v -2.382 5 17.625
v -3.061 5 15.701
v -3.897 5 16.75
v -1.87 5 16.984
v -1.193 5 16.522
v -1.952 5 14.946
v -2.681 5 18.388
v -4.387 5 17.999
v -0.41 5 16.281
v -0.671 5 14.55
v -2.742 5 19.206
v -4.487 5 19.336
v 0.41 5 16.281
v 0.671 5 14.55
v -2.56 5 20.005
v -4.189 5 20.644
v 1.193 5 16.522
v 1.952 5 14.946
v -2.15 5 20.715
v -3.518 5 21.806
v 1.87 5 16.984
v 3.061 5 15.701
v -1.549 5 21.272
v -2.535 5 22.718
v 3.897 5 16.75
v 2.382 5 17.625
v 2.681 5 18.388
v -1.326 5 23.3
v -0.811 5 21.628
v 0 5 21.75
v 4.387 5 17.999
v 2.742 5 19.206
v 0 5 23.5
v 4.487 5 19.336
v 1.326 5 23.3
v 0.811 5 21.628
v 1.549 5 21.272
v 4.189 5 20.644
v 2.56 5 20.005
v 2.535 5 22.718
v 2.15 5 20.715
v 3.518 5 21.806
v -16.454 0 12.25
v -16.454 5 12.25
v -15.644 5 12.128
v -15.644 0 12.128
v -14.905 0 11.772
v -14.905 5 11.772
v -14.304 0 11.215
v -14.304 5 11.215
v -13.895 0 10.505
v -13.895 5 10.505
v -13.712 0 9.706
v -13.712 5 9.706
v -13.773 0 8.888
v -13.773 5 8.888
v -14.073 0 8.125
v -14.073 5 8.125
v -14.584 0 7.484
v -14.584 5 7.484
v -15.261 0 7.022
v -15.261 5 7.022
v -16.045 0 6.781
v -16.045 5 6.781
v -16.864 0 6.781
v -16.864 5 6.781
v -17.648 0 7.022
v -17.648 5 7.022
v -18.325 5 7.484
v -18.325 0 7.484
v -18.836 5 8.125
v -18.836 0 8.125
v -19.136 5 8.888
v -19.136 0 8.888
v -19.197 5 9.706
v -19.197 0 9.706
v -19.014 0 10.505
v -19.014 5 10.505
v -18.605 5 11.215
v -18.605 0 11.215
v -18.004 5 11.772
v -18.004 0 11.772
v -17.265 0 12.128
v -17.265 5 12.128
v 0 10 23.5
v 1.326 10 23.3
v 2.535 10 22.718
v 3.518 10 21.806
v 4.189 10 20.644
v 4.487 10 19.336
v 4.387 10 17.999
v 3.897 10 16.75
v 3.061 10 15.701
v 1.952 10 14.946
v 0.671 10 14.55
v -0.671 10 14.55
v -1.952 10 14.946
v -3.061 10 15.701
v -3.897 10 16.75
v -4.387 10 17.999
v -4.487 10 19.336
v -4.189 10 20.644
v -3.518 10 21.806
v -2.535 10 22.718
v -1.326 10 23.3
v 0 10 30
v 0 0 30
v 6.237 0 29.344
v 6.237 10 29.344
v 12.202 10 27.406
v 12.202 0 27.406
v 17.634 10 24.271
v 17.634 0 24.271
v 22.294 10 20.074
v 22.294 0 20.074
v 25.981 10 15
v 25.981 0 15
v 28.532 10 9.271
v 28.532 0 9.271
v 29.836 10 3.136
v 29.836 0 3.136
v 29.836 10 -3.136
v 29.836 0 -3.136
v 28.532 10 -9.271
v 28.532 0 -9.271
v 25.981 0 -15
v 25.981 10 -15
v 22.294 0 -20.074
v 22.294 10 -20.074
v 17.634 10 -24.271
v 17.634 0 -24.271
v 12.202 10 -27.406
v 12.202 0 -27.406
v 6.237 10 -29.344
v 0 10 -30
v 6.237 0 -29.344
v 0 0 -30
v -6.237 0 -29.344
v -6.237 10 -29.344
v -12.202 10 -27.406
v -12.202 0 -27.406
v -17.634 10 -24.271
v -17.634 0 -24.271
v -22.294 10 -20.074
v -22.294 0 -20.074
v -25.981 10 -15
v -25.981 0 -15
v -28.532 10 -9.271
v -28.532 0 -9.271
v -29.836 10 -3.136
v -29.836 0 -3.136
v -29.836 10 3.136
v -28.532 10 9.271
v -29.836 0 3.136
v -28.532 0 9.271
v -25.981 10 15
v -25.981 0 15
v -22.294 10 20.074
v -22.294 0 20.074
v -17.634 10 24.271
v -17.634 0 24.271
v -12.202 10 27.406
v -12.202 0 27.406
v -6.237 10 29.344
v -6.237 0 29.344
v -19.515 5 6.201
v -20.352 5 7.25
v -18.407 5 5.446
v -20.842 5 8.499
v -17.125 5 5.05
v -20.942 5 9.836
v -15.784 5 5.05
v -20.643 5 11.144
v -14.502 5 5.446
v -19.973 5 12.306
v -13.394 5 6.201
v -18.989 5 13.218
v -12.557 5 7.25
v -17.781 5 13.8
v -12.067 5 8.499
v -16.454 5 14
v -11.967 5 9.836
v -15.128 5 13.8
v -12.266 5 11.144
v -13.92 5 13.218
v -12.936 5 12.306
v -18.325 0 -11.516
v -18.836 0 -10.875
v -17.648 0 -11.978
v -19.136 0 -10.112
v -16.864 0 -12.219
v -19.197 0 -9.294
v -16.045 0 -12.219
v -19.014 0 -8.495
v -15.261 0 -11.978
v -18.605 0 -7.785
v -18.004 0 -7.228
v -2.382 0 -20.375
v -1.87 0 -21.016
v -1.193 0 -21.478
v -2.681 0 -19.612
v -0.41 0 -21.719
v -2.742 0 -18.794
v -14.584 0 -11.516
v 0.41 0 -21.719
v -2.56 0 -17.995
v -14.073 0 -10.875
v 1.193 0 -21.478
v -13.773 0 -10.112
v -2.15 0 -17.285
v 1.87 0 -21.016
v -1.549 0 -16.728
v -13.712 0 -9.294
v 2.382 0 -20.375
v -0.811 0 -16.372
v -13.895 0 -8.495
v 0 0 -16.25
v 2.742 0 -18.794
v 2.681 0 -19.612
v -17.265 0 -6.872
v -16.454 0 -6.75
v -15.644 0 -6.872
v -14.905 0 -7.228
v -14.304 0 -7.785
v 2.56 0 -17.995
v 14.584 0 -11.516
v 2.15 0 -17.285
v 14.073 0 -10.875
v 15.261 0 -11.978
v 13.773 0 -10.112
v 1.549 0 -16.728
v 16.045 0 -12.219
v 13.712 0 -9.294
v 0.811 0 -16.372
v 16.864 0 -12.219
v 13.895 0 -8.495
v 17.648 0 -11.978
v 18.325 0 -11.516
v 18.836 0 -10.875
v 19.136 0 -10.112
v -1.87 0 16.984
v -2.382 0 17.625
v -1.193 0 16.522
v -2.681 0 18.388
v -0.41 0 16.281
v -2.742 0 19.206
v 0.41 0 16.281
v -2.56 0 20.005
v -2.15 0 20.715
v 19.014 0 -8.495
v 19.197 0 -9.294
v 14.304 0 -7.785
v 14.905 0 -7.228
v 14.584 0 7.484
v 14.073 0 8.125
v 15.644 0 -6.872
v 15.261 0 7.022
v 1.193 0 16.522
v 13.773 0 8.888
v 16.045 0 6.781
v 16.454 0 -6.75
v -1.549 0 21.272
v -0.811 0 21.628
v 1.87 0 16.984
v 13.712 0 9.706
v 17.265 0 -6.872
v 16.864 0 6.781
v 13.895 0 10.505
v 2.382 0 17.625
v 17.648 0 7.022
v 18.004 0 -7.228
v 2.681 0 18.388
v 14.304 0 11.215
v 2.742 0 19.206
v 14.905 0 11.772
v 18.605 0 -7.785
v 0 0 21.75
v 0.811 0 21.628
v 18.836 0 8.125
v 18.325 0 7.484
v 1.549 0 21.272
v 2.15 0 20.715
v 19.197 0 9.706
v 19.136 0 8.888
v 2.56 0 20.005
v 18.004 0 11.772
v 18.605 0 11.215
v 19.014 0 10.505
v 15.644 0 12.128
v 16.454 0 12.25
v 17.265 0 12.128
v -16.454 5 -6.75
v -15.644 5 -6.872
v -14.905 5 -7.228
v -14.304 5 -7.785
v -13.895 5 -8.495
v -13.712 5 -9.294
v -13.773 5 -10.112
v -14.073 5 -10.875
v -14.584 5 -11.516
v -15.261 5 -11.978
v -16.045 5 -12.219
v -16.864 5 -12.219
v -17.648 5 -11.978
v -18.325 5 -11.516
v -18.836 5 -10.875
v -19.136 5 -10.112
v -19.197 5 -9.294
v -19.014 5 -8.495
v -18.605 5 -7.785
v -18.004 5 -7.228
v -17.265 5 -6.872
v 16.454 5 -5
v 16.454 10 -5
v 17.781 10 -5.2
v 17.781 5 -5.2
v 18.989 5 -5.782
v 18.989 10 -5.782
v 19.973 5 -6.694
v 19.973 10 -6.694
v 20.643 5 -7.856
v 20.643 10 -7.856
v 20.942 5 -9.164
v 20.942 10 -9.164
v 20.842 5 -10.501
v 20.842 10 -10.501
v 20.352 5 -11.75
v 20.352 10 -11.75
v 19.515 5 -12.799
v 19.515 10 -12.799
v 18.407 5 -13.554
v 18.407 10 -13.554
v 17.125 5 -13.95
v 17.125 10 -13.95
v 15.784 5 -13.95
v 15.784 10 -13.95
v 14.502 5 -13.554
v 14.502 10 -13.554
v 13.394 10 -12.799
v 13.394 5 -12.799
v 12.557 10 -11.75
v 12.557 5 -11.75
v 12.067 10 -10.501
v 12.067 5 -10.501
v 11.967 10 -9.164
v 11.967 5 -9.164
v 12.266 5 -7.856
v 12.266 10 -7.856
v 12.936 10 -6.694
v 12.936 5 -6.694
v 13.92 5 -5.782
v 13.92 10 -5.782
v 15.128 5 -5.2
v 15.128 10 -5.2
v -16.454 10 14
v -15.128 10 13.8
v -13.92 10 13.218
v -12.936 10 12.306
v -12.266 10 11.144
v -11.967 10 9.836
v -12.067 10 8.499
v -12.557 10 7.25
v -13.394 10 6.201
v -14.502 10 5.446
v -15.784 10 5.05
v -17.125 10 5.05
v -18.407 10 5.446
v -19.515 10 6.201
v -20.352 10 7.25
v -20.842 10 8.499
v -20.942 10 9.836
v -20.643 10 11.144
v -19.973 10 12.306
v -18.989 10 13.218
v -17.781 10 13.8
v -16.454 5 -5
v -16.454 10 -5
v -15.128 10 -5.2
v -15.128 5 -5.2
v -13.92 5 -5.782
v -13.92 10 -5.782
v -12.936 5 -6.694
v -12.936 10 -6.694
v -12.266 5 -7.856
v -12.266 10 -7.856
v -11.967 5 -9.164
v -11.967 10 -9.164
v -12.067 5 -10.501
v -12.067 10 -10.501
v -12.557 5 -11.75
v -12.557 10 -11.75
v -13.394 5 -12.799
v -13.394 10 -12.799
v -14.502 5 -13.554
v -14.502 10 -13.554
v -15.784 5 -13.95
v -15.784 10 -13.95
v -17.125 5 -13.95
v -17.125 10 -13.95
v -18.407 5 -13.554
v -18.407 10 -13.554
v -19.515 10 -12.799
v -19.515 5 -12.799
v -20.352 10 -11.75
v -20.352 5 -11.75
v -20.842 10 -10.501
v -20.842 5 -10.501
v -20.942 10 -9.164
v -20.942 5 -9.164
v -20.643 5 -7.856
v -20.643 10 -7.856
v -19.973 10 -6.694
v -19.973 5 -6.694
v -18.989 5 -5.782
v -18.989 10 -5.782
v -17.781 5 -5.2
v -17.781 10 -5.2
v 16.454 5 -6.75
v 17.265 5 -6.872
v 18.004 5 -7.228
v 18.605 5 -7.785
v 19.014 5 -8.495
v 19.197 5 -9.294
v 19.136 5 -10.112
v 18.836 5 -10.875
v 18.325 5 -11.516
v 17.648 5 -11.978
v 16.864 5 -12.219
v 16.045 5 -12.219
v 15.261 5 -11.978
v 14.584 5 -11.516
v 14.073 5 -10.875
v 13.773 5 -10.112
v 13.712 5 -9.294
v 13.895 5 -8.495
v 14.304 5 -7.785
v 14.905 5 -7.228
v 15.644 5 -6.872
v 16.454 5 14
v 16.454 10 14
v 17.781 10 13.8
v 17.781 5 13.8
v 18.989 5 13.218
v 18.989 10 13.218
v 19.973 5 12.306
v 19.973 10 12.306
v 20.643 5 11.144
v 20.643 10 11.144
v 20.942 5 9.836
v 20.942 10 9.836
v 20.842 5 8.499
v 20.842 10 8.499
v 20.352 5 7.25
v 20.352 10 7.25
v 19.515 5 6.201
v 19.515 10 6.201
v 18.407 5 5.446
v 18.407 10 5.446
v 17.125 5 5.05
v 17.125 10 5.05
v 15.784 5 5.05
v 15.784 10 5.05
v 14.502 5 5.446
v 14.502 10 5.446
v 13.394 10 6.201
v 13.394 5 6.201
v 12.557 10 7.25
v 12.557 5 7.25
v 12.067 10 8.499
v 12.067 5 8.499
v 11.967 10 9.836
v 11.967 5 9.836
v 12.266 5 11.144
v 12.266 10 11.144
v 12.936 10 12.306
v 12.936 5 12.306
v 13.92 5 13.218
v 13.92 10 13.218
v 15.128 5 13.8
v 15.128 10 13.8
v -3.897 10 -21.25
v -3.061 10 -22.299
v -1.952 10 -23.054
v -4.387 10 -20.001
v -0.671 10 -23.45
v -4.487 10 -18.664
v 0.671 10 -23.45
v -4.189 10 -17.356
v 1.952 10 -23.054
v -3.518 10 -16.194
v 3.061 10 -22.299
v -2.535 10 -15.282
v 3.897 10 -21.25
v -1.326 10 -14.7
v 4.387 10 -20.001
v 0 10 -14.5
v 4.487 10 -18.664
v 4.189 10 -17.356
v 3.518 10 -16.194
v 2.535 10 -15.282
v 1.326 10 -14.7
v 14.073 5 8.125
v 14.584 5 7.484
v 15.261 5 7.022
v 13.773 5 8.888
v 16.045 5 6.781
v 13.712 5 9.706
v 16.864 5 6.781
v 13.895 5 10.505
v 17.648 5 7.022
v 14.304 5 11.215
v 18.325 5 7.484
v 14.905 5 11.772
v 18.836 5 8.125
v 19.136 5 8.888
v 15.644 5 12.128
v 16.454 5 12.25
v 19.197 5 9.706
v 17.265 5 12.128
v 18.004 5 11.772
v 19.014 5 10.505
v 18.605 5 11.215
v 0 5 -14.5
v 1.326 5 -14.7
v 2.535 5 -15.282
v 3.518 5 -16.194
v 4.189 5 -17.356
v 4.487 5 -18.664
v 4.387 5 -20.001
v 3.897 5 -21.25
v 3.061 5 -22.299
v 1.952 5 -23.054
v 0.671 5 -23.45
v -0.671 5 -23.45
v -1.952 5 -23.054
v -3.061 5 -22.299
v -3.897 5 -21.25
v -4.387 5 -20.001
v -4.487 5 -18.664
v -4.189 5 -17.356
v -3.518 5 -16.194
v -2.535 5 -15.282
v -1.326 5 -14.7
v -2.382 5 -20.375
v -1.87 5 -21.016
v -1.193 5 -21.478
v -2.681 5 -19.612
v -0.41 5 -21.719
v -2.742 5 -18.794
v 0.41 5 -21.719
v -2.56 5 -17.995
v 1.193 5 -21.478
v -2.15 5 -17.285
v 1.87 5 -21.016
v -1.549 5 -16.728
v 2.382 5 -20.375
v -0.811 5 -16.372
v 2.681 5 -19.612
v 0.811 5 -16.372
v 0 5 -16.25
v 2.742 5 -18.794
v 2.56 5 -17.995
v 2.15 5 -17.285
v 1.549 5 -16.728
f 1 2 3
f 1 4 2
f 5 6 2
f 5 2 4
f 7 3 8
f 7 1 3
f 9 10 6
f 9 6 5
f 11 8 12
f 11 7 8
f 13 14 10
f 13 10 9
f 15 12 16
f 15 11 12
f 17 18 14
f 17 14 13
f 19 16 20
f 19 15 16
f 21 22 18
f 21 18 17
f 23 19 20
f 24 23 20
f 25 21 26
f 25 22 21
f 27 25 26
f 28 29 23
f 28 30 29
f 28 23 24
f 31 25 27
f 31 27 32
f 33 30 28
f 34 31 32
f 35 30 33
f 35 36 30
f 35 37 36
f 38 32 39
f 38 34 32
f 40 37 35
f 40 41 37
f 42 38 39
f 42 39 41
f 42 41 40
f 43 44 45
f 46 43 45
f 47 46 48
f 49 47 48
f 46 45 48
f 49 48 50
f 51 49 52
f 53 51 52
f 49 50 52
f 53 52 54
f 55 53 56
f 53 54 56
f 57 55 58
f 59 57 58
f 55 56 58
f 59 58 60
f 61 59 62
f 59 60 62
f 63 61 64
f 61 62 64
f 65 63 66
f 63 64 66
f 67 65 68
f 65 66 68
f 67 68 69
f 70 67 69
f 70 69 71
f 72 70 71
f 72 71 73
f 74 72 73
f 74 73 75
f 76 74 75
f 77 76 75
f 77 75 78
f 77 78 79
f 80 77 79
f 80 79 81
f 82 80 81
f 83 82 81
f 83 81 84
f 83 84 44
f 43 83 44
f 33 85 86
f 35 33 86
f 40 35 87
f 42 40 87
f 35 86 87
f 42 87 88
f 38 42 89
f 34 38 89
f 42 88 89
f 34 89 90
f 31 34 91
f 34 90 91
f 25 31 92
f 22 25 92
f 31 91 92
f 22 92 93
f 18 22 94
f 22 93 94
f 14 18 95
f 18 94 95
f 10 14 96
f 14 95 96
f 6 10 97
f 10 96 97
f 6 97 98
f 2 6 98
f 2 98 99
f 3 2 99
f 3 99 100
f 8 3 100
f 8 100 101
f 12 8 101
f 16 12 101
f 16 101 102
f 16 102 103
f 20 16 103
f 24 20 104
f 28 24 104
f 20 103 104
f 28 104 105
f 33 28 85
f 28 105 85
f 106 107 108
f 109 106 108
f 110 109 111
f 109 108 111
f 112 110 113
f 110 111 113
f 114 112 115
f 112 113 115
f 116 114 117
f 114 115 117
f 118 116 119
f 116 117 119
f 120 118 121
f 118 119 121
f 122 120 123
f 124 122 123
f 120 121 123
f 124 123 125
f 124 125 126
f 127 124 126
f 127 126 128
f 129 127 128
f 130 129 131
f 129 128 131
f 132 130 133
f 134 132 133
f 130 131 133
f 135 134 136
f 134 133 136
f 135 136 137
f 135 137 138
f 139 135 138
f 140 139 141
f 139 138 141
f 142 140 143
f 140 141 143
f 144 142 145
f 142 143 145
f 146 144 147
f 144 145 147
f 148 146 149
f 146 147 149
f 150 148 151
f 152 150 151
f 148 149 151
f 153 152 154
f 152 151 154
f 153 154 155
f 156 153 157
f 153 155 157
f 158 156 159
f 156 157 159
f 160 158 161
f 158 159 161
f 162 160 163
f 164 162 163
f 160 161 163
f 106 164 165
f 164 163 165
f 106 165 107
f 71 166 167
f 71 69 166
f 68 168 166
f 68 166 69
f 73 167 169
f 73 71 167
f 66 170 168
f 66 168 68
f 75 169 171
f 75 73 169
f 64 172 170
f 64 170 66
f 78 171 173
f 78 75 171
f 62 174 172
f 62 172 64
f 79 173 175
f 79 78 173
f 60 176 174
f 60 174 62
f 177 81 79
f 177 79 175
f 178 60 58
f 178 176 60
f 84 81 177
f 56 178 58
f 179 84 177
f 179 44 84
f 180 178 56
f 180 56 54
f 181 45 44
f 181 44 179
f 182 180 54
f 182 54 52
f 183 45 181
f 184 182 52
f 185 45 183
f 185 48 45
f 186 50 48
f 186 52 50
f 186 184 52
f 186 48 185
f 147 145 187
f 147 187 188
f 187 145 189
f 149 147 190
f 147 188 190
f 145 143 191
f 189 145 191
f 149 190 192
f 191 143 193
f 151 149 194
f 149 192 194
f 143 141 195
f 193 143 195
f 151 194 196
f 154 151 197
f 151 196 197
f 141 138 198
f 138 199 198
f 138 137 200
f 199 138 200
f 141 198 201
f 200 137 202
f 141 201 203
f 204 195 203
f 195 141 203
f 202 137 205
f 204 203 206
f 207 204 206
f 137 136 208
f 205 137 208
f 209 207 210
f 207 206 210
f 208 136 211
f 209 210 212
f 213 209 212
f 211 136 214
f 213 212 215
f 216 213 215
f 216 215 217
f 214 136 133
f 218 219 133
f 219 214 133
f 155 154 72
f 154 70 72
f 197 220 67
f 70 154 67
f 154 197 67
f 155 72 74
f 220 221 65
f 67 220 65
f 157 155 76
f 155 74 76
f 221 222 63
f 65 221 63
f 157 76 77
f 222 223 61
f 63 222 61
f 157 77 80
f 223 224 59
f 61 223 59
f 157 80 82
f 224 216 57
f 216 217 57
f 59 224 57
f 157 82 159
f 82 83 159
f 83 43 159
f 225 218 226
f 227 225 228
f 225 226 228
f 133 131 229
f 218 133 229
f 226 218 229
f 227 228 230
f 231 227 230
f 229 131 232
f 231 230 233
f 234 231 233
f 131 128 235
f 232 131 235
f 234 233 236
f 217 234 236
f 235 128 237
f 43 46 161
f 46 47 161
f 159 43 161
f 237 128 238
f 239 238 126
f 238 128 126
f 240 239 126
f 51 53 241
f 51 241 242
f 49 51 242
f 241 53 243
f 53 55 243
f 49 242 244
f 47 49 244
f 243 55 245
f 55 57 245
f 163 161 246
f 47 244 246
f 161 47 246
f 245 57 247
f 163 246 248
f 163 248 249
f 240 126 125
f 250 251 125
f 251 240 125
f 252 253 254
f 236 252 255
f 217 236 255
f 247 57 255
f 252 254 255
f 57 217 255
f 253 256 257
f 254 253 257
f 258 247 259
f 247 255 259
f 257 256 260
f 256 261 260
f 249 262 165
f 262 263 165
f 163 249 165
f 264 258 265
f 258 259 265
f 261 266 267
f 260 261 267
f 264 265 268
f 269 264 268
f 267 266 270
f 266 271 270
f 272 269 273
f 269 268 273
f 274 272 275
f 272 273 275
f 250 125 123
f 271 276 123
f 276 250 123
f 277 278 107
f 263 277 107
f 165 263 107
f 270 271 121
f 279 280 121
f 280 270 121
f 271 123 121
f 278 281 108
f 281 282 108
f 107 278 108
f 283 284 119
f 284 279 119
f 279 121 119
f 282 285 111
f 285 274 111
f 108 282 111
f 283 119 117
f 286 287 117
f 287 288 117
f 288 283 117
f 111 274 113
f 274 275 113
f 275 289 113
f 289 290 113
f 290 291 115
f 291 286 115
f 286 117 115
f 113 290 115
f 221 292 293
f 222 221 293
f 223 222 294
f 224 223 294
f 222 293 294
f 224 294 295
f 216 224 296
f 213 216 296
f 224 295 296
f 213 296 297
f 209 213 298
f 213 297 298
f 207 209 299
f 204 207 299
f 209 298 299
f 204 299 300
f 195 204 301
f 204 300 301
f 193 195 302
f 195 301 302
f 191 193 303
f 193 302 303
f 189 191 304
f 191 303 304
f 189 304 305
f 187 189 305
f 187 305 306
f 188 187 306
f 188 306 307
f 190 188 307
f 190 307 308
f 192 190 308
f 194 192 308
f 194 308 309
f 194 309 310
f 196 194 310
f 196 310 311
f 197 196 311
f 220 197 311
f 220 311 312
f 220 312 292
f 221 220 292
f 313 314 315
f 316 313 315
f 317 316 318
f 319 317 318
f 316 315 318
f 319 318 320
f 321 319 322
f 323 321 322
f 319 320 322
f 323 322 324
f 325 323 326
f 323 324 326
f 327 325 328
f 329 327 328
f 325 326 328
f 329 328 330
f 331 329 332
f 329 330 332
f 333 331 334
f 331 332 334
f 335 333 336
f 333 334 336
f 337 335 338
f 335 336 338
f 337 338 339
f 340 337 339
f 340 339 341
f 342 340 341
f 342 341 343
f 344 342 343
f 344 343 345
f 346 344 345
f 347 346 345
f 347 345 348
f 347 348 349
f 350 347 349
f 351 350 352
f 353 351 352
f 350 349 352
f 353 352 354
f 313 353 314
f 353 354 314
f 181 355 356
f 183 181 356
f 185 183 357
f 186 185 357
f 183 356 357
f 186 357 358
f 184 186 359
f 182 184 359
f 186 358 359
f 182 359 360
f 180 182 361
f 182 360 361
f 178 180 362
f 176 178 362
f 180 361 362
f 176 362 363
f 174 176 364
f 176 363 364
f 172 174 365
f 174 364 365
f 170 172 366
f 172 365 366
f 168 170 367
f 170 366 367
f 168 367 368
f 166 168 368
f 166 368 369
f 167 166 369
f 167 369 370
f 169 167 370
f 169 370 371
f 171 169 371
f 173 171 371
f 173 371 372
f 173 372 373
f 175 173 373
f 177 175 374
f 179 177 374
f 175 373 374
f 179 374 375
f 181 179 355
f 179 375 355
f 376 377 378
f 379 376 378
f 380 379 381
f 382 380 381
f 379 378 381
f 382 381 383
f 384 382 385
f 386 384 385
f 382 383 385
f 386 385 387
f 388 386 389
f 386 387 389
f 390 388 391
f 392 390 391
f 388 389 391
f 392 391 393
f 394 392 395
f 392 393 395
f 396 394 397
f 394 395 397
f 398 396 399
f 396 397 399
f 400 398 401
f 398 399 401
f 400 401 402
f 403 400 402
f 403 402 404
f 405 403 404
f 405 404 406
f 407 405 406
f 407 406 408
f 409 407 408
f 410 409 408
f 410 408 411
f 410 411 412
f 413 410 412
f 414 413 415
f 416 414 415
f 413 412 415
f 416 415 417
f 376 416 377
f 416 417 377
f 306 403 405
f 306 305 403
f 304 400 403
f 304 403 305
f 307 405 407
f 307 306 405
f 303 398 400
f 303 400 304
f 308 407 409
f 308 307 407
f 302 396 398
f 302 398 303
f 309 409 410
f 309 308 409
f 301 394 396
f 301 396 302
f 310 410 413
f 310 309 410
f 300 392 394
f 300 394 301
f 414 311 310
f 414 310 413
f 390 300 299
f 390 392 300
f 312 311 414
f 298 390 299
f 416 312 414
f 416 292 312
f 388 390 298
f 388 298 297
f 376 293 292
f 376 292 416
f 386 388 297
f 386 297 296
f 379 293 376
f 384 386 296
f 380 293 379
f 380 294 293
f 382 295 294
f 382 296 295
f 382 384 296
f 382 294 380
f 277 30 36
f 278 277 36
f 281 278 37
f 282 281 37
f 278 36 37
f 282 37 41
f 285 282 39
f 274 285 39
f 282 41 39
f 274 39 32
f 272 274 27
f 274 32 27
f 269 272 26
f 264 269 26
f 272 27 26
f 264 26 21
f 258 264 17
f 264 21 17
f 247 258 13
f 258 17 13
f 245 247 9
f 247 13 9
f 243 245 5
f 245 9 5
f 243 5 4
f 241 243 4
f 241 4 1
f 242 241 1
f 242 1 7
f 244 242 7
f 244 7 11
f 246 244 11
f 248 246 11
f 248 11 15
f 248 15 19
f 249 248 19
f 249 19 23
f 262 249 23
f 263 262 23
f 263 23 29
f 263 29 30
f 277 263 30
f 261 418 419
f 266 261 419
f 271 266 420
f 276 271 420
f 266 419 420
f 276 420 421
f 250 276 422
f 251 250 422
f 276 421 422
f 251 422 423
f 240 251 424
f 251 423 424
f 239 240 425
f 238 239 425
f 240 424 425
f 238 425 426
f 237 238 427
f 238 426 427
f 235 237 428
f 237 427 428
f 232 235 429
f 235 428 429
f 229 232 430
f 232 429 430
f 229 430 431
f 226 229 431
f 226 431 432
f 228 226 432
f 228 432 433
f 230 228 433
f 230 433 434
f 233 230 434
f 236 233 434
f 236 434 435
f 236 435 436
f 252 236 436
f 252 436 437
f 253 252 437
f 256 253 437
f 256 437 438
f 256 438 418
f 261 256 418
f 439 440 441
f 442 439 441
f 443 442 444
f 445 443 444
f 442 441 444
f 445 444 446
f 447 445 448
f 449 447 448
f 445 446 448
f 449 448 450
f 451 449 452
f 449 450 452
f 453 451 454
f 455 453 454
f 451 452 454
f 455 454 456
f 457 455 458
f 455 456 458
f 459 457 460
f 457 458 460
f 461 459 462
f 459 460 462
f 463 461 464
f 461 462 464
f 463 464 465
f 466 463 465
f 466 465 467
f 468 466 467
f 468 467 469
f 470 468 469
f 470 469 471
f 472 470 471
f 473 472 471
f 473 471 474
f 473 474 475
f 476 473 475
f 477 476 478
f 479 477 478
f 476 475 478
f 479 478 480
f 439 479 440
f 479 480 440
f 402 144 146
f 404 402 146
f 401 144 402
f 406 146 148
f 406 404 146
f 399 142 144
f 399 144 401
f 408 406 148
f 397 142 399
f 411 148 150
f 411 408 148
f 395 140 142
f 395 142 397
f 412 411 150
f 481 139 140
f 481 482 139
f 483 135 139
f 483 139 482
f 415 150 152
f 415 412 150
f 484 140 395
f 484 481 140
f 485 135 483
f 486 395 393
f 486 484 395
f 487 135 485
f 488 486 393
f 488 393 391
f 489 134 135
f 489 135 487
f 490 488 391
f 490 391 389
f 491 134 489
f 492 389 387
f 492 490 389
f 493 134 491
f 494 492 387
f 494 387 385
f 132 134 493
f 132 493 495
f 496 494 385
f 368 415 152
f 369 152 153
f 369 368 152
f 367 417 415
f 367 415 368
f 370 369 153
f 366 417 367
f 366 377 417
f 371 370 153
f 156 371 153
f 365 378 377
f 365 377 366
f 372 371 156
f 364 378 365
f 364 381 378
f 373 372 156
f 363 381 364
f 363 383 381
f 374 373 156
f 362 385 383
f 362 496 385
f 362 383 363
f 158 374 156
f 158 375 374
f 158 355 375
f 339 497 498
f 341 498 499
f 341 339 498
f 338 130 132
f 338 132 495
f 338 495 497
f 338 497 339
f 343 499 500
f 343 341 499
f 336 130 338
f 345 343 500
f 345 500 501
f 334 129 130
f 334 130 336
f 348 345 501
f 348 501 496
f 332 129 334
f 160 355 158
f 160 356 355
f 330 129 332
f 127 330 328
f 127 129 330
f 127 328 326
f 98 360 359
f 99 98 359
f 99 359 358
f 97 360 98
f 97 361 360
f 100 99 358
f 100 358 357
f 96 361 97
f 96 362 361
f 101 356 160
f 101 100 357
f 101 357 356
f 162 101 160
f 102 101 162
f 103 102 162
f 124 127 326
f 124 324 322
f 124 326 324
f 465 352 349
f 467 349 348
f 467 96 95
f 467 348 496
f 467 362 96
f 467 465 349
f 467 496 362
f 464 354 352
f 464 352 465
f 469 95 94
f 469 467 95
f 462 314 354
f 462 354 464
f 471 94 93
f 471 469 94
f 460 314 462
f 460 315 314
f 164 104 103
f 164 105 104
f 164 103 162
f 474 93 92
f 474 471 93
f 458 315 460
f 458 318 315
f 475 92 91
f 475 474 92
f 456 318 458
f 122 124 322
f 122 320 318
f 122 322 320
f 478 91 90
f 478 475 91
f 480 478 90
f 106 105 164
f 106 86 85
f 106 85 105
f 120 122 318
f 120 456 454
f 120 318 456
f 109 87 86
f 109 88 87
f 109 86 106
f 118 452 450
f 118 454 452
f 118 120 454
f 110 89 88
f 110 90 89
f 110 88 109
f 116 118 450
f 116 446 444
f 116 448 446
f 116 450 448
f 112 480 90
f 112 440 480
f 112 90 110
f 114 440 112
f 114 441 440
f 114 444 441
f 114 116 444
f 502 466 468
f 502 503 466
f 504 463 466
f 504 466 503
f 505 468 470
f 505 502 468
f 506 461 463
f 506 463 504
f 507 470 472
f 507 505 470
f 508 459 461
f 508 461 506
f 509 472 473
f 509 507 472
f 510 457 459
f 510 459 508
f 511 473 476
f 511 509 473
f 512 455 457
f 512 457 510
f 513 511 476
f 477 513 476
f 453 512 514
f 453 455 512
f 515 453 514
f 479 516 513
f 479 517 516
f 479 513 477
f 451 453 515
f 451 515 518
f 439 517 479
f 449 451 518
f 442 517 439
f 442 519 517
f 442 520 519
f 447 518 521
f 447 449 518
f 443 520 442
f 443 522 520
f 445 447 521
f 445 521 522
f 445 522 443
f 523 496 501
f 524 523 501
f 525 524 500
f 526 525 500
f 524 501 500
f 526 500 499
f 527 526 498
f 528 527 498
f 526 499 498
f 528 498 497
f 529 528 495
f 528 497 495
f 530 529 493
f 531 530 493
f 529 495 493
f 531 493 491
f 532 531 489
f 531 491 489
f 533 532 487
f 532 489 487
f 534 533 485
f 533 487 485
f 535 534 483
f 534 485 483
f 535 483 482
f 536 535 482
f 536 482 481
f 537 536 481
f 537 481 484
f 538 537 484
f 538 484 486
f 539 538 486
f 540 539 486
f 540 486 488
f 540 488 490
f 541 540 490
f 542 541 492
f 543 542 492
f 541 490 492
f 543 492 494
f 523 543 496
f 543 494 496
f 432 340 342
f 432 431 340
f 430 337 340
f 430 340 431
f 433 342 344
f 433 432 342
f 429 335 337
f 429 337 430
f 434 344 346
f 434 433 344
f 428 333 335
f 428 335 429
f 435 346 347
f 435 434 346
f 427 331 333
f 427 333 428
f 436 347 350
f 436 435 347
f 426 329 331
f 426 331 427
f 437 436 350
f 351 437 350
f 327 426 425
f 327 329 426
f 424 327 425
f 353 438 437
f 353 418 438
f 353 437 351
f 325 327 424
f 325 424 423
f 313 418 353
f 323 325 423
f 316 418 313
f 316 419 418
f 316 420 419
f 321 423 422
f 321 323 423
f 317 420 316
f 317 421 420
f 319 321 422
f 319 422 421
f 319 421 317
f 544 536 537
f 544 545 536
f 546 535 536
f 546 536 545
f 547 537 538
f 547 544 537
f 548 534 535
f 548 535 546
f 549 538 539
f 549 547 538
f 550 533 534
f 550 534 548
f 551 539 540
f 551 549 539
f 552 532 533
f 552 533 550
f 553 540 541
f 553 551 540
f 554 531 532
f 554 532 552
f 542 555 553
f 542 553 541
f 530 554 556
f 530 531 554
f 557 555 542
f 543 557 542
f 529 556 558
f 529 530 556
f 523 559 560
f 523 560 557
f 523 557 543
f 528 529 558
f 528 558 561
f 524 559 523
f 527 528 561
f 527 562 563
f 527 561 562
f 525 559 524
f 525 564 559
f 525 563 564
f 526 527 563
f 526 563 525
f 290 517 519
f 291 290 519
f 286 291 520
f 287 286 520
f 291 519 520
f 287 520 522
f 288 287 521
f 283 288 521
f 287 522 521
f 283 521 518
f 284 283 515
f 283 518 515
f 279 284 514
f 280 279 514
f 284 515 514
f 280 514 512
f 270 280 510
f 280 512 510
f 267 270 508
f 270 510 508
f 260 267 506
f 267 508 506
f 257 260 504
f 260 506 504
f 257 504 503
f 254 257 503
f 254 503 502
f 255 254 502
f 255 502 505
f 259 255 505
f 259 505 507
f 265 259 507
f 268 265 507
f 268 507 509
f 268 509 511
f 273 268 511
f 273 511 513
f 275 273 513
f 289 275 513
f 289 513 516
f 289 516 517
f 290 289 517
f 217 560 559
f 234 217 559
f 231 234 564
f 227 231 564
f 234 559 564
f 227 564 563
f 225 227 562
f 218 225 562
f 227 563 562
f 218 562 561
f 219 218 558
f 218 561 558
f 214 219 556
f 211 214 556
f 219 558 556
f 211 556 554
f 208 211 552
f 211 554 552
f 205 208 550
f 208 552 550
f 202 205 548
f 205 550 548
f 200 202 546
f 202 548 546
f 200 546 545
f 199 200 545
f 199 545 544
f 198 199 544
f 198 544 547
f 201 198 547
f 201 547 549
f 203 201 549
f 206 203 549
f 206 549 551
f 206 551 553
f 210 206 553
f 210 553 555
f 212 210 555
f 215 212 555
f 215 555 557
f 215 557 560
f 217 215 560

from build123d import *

# Parameters (mm, degrees)
SKETCH1_R           = 30
BOSS_EXTRUDE1_DEPTH = 10
SKETCH2_R           = 4.5
CUT_EXTRUDE1_DEPTH  = 5
SKETCH3_R           = 2.75
CUT_EXTRUDE2_DEPTH  = 43.720018727


with BuildPart() as part:
    # Sketch1 → Boss-Extrude1 (new body)
    with BuildSketch(Plane(origin=(0, 0, 0), x_dir=(1, 0, 0), z_dir=(0, 1, 0))):
        with Locations(Location((0, 0, 0), (0, 0, 270))):
            Circle(SKETCH1_R)
    extrude(amount=BOSS_EXTRUDE1_DEPTH)

    # Sketch2 → Cut-Extrude1 (cut)
    with BuildSketch(Plane(origin=(0, 10, 0), x_dir=(1, 0, 0), z_dir=(0, 1, 0))):
        with Locations(Location((0, 19, 0), (0, 0, 270))):
            Circle(SKETCH2_R)
        with Locations(Location((16.454482672, 9.5, 0), (0, 0, 270))):
            Circle(SKETCH2_R)
        with Locations(Location((16.454482672, -9.5, 0), (0, 0, 270))):
            Circle(SKETCH2_R)
        with Locations(Location((0, -19, 0), (0, 0, 270))):
            Circle(SKETCH2_R)
        with Locations(Location((-16.454482672, -9.5, 0), (0, 0, 270))):
            Circle(SKETCH2_R)
        with Locations(Location((-16.454482672, 9.5, 0), (0, 0, 270))):
            Circle(SKETCH2_R)
    extrude(amount=-CUT_EXTRUDE1_DEPTH, mode=Mode.SUBTRACT)

    # Sketch3 → Cut-Extrude2 (cut, through all)
    with BuildSketch(Plane(origin=(0, 5, 0), x_dir=(1, 0, 0), z_dir=(0, 1, 0))):
        with Locations(Location((0, 19, 0), (0, 0, 270))):
            Circle(SKETCH3_R)
        with Locations(Location((16.454482672, 9.5, 0), (0, 0, 270))):
            Circle(SKETCH3_R)
        with Locations(Location((16.454482672, -9.5, 0), (0, 0, 270))):
            Circle(SKETCH3_R)
        with Locations(Location((0, -19, 0), (0, 0, 270))):
            Circle(SKETCH3_R)
        with Locations(Location((-16.454482672, -9.5, 0), (0, 0, 270))):
            Circle(SKETCH3_R)
        with Locations(Location((-16.454482672, 9.5, 0), (0, 0, 270))):
            Circle(SKETCH3_R)
    extrude(amount=-CUT_EXTRUDE2_DEPTH, mode=Mode.SUBTRACT)


solid = part.part
